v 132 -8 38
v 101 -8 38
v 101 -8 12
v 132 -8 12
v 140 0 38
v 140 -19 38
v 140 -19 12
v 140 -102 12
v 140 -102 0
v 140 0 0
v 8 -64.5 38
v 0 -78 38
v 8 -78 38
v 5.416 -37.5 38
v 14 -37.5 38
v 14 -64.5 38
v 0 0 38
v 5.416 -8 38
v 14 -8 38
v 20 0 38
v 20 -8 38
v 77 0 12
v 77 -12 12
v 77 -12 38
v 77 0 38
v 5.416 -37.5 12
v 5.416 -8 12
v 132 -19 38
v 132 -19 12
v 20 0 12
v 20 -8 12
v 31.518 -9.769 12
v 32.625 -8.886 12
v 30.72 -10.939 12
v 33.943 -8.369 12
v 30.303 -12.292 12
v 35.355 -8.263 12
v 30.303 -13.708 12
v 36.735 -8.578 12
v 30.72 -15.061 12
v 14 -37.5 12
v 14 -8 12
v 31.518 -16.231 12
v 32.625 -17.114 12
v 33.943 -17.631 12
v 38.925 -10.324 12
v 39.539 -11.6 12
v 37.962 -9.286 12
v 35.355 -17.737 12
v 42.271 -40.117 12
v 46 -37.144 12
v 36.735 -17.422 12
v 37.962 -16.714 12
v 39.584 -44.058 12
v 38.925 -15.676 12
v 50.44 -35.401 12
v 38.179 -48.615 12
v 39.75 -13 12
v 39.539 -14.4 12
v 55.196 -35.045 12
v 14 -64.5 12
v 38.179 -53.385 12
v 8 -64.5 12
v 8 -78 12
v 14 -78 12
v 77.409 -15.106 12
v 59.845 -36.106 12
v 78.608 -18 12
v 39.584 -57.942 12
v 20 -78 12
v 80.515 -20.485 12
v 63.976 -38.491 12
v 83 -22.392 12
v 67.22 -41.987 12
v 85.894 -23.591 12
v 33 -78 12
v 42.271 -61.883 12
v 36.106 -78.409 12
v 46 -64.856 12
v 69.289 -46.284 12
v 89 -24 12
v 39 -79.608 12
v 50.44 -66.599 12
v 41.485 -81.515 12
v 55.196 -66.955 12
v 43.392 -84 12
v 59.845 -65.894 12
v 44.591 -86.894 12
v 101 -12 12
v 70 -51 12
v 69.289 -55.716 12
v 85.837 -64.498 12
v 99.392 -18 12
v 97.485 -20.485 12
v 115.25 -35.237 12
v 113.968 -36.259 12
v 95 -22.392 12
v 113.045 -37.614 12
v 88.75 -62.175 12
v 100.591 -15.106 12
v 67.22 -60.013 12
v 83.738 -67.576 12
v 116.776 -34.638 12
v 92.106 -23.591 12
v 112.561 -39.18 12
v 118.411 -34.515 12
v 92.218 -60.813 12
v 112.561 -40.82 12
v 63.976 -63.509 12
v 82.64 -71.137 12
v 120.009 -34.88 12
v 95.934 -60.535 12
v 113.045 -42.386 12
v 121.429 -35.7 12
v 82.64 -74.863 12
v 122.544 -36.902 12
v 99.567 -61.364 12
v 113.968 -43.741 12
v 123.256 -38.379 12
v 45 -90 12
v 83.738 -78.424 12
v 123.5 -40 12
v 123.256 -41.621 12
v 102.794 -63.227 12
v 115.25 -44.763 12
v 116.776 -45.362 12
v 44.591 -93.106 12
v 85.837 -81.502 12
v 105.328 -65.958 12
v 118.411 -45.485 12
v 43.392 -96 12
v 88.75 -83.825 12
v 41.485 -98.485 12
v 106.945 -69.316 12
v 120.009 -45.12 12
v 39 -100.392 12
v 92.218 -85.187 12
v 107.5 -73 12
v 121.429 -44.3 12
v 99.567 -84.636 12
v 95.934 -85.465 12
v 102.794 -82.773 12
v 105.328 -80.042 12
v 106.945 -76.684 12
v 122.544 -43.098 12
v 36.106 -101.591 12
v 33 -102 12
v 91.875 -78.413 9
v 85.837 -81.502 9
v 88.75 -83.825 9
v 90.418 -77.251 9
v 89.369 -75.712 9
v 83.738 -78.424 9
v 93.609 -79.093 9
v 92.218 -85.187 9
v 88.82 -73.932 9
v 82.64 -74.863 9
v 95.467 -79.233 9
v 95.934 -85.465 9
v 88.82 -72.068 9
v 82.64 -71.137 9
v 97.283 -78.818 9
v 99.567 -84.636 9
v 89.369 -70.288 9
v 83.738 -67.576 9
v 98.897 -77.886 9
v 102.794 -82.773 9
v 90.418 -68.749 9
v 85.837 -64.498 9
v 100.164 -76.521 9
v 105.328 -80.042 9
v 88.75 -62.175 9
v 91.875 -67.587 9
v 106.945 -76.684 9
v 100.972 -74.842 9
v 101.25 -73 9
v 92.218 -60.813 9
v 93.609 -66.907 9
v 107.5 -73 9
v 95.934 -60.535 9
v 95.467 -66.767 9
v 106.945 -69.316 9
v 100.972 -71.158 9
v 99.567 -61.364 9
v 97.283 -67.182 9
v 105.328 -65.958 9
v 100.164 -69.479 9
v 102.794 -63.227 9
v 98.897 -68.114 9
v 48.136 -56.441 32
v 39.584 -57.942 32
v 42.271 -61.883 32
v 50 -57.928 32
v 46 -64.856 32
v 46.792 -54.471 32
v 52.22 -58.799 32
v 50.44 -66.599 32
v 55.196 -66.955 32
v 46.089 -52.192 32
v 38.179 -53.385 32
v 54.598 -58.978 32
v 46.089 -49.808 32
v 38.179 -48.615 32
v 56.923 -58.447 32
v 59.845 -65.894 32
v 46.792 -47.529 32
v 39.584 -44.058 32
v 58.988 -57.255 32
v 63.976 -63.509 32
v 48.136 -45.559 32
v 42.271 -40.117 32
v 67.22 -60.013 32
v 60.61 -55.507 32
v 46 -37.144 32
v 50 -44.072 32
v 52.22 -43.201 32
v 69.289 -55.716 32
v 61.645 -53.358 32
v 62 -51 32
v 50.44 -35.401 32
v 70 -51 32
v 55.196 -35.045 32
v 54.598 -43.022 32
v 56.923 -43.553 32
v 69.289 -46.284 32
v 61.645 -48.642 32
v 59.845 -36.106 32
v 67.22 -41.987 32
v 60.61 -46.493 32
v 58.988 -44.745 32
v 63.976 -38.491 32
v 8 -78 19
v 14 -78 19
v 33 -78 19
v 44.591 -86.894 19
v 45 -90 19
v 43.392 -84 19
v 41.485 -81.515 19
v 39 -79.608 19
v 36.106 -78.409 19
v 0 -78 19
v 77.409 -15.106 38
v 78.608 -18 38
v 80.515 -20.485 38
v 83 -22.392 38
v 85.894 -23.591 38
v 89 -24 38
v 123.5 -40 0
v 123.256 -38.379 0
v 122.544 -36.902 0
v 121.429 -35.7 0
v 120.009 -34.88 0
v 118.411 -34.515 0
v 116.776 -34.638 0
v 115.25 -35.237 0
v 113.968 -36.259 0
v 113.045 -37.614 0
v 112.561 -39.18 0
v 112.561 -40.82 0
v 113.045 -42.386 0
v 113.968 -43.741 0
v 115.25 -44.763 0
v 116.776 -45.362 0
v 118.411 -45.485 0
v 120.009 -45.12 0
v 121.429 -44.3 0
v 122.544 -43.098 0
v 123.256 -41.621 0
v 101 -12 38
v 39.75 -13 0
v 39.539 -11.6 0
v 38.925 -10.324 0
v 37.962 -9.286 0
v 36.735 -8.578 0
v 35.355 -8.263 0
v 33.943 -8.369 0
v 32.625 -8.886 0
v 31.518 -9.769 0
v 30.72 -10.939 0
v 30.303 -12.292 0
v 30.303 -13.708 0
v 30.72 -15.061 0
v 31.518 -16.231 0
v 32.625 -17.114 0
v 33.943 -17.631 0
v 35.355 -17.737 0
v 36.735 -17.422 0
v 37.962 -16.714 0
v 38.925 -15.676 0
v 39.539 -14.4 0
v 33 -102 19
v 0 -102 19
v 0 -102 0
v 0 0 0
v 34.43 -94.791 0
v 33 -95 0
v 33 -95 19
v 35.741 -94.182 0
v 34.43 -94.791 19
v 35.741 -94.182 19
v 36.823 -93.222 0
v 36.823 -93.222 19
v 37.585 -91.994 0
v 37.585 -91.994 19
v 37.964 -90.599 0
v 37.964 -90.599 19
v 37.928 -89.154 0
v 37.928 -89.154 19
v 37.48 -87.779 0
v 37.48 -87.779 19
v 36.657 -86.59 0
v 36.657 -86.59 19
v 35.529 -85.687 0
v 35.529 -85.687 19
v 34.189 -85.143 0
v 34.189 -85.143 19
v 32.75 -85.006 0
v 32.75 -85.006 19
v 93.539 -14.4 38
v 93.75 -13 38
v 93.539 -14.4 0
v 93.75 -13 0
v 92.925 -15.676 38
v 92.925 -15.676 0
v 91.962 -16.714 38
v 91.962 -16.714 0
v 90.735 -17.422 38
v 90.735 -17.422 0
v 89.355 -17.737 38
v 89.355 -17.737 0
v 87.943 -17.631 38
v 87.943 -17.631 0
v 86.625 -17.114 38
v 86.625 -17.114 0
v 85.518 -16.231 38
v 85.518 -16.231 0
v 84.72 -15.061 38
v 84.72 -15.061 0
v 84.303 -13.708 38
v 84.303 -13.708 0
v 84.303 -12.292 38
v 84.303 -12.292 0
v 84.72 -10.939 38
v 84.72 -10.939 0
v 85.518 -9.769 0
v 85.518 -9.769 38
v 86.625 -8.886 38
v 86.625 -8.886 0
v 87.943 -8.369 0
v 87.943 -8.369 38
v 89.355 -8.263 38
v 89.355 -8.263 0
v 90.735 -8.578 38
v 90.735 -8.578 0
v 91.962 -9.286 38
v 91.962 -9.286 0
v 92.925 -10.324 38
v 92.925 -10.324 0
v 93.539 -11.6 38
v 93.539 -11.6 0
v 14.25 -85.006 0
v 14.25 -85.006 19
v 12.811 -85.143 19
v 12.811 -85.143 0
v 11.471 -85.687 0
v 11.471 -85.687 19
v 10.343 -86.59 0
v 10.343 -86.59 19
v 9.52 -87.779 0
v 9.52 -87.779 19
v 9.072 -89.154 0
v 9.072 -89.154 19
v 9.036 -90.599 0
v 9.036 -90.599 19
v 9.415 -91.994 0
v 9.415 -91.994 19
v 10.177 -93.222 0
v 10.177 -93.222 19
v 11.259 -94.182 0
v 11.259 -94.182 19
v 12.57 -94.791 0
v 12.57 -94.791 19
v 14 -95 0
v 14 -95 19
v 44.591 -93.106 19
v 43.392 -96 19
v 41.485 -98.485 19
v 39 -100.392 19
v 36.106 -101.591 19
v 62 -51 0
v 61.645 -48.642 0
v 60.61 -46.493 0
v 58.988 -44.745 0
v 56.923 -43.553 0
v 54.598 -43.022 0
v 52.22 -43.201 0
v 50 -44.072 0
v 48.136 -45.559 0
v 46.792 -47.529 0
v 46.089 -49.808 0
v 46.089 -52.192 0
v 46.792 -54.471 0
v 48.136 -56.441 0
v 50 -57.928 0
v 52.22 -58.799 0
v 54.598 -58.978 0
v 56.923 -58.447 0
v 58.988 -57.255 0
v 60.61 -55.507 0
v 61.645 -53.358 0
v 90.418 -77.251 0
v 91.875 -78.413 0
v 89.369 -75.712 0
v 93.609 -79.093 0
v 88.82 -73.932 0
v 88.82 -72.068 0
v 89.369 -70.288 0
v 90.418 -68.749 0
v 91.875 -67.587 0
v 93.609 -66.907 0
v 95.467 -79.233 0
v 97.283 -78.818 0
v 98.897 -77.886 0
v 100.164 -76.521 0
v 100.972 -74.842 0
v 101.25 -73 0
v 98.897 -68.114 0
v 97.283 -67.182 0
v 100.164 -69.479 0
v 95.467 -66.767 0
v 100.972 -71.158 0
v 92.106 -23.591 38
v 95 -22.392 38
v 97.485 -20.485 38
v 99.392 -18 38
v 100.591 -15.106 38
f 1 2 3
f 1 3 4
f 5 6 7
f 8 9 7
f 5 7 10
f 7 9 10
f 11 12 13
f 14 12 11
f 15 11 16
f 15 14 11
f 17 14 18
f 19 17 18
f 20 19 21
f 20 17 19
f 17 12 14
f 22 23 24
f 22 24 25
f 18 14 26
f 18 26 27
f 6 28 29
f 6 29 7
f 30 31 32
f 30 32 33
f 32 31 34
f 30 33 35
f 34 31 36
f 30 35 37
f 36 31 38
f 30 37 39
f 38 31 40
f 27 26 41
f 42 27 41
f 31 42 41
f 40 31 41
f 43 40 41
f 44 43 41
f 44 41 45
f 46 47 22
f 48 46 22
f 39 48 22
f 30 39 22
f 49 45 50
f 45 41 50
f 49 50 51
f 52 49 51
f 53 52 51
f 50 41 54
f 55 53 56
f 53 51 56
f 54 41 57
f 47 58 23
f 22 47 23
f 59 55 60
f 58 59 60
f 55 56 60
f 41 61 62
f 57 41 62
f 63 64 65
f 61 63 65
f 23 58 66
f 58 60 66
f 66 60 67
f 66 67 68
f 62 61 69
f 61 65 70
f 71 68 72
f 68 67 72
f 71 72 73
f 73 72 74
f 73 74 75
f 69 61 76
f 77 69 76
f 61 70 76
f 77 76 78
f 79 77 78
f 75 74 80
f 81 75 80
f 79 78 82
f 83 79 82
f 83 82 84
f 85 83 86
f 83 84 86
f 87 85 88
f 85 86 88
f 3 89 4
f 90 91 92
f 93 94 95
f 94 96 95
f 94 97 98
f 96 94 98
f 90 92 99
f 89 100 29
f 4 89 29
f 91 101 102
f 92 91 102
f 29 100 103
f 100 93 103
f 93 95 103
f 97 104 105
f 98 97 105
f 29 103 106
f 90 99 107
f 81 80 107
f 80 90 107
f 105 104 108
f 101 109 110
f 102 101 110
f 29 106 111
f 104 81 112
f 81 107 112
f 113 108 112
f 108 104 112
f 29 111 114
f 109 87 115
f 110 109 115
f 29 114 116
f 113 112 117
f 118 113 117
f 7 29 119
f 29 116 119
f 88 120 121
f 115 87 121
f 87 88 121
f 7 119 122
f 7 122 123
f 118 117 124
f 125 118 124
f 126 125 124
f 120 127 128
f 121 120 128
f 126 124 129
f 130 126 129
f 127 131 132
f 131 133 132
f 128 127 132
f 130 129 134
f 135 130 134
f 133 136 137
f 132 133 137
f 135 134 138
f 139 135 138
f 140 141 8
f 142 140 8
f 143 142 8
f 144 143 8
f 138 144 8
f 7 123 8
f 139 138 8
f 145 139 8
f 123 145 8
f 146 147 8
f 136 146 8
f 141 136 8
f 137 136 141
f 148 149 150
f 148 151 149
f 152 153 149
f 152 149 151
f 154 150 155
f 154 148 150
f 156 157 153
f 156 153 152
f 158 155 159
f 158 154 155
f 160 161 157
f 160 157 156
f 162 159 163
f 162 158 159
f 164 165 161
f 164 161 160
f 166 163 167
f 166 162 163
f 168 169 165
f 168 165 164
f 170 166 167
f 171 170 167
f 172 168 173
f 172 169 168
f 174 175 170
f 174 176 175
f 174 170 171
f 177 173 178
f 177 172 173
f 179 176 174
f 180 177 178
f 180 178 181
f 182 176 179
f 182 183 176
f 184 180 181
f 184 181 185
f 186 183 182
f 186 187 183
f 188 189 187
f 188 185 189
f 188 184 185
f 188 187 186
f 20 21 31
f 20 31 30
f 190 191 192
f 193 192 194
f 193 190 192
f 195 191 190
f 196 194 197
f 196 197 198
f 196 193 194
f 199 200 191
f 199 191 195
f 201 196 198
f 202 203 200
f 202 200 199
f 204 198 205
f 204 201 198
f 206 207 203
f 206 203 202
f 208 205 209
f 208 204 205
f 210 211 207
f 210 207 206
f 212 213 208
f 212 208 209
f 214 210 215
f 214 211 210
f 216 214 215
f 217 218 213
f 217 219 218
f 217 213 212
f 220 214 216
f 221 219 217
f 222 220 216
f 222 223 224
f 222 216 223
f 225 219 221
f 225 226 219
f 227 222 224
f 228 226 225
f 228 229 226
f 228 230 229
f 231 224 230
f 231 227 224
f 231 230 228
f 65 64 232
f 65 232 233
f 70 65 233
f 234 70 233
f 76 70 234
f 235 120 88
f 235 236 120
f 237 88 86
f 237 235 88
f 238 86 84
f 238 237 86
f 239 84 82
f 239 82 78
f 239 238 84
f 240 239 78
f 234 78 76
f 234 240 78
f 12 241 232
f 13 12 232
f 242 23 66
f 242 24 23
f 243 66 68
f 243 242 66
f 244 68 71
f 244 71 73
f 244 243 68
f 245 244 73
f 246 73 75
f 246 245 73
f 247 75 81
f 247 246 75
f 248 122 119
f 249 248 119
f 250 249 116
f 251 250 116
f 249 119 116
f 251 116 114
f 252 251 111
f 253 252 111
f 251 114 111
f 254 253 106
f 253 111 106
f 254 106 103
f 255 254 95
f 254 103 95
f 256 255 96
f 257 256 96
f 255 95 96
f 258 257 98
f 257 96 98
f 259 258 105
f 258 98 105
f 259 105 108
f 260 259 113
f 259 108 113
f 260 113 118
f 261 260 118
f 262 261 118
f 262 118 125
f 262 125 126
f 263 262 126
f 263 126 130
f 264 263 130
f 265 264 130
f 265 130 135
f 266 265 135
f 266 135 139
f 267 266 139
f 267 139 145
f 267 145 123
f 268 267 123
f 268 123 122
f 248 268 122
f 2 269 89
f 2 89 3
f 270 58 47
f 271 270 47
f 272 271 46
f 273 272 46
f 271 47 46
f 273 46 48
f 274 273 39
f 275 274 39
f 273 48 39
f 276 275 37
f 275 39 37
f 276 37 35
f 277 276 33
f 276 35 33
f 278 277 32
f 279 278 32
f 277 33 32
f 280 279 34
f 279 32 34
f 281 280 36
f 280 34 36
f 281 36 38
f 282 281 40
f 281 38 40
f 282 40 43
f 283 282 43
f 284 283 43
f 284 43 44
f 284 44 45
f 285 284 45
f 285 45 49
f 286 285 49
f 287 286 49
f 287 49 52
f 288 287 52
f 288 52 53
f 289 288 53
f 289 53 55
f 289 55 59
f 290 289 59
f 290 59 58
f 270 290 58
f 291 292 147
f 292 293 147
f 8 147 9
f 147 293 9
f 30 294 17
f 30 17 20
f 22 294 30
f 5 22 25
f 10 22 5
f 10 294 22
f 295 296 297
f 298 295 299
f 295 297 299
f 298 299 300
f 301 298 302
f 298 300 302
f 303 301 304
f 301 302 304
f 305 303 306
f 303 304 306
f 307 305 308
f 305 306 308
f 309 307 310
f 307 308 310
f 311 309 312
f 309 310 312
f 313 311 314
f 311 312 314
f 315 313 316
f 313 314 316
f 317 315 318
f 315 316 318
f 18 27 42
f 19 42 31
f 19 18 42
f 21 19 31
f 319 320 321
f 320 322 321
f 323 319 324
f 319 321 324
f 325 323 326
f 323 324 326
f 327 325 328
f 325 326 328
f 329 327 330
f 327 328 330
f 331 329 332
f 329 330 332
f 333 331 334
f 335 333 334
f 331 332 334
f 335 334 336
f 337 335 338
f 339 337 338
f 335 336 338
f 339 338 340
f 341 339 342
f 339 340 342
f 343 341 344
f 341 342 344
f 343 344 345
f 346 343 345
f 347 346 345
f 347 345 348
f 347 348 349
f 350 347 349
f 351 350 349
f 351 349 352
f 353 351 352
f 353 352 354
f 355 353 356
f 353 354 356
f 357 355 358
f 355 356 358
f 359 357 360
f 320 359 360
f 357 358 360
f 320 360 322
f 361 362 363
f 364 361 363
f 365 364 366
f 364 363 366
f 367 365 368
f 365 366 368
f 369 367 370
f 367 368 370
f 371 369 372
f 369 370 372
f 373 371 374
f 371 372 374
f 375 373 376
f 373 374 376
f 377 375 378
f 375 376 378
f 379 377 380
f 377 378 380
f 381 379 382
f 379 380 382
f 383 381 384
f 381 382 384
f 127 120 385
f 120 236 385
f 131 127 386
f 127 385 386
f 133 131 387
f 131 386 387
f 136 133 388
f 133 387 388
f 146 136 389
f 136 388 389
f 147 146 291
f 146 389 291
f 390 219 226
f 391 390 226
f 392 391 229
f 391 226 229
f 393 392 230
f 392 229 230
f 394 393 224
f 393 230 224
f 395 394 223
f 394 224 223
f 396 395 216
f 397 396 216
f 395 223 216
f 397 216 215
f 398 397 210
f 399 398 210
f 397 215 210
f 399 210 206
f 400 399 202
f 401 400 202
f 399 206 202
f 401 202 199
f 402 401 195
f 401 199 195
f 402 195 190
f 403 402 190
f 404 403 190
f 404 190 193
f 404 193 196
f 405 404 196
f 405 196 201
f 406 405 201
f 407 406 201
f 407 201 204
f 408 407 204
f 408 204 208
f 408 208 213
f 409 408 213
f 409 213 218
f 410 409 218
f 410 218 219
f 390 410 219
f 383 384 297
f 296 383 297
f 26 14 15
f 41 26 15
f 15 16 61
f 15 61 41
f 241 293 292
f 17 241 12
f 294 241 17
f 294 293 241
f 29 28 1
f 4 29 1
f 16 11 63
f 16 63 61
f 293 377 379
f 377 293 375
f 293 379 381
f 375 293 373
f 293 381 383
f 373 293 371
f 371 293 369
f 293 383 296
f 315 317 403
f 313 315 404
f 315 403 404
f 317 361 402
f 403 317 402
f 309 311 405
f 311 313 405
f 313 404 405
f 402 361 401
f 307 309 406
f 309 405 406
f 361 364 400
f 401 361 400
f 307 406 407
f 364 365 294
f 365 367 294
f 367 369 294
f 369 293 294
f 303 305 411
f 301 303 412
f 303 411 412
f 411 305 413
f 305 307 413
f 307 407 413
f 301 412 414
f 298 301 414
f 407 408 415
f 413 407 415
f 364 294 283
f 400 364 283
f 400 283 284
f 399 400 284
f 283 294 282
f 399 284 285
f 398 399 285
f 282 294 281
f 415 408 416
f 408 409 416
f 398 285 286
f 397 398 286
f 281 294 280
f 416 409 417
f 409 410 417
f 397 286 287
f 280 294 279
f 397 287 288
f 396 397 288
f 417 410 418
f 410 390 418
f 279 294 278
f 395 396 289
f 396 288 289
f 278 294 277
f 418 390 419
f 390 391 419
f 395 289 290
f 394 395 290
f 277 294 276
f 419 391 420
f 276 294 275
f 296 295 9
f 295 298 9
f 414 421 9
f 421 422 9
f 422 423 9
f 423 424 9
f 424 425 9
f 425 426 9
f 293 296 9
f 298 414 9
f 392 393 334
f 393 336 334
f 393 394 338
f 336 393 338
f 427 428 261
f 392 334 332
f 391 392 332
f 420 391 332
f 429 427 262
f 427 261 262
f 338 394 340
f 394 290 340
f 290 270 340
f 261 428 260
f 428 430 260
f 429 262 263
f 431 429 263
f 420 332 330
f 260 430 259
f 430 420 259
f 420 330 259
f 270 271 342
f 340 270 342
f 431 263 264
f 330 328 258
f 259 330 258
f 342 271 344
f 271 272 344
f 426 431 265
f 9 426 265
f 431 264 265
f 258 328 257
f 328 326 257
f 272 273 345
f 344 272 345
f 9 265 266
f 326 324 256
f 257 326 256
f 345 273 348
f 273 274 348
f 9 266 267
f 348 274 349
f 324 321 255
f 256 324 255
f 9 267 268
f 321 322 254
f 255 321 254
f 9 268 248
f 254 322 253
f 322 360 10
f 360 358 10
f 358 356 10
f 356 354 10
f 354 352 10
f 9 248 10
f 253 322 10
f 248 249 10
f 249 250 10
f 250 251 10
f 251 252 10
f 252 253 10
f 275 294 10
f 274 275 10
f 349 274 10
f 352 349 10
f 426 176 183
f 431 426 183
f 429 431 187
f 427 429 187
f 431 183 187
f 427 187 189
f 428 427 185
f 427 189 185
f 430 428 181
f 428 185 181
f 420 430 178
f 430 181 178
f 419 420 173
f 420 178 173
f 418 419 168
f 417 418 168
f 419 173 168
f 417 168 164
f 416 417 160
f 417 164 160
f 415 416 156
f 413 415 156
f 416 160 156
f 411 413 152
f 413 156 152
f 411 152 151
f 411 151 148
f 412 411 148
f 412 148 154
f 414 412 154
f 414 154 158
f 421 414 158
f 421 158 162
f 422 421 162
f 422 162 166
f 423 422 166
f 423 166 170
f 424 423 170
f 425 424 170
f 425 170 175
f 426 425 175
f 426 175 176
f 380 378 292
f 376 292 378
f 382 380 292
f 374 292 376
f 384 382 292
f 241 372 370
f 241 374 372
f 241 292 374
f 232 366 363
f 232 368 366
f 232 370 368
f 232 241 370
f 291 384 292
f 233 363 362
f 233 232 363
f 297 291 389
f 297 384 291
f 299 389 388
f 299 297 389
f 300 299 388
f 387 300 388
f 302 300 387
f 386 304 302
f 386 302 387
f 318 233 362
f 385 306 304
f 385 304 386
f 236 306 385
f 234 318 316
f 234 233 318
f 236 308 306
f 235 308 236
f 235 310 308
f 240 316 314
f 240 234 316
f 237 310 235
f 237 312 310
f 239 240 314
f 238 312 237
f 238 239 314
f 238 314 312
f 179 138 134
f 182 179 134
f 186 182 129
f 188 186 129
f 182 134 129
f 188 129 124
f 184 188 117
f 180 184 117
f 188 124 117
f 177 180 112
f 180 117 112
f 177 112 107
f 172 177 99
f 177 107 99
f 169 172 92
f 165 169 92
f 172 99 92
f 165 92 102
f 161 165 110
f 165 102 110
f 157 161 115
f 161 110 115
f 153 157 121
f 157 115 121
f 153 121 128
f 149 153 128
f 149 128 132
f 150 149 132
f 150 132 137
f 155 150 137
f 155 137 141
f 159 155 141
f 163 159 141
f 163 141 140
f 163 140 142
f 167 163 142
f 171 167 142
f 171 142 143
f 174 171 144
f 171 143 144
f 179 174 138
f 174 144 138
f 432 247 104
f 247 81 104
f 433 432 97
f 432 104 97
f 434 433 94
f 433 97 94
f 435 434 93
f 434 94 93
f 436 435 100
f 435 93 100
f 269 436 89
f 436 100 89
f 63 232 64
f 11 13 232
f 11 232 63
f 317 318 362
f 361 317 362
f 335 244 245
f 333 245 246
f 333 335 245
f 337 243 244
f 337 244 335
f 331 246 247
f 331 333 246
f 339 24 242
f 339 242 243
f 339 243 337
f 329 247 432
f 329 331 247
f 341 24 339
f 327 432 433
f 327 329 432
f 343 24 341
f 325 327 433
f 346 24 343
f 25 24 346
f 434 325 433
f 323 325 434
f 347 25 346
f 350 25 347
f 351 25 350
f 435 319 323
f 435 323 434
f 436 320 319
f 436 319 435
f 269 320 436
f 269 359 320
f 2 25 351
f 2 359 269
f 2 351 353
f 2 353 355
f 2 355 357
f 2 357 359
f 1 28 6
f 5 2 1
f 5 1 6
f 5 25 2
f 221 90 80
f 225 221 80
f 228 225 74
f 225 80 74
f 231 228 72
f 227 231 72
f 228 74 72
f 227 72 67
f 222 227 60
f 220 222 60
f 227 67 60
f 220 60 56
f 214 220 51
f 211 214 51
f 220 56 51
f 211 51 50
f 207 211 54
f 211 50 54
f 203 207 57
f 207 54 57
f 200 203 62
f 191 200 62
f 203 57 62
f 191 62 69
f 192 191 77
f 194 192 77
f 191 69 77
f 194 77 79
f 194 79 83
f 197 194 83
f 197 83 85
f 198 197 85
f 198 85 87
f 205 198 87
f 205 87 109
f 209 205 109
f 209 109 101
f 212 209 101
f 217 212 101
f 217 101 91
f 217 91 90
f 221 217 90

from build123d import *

# Parameters (mm, degrees)
F0_W      = 140
F0_H      = 38
F1_DEPTH  = 102
F2_R      = 4.75
F3_DEPTH  = 40
F4_R      = 8
F5_DEPTH  = 40
F6_R      = 6.25
F7_DEPTH  = 40
F8_R      = 5.5
F9_DEPTH  = 40
F10_W     = 140
F10_H     = 26
F11_DEPTH = 102
F12_R     = 16
F13_DEPTH = 26
F14_R     = 8
F15_DEPTH = 26
F16_W     = 45
F16_H     = 24
F17_DEPTH = 7
F18_R     = 12
F19_R     = 11.99999
F20_W     = 20
F20_H     = 78
F21_DEPTH = 26
F22_W     = 63
F22_H     = 24
F23_DEPTH = 26
F24_R     = 4.75
F25_DEPTH = 38
F26_R     = 12
F27_R     = 5
F28_DEPTH = 40
F30_DEPTH = 40
F31_W     = 19
F31_H     = 5
F32_DEPTH = 40
F33_W     = 31
F33_H     = 16
F34_DEPTH = 26
F35_R     = 11.99999
F36_W     = 8
F36_H     = 5
F37_DEPTH = 26
F38_R     = 16
F39_DEPTH = 6
F40_W     = 6
F40_H     = 74.1499609053
F41_DEPTH = 26
F42_W     = 6
F42_H     = 4
F43_DEPTH = 26
F44_W     = 6
F44_H     = 13.5
F45_DEPTH = 26
F46_W     = 8.5837110281
F46_H     = 29.5
F47_DEPTH = 26
F48_W     = 6
F48_H     = 0.1499609053
F49_DEPTH = 26
F50_R     = 12.5
F51_DEPTH = 3


# Not quite as in the source:
# - a fillet or chamfer is up to 0.001 mm smaller than in the source, because OpenCascade refuses the exact size


with BuildPart() as f1:
    # F0 (on Front) → F1 (new body)
    with BuildSketch(Plane.XZ):
        with Locations((70, 19)):
            Rectangle(F0_W, F0_H)
    extrude(amount=F1_DEPTH)

    # F2 (on face) → F3 (cut)
    with BuildSketch(Plane.XY.offset(38)):
        with Locations((35, -13)):
            Circle(F2_R)
        with Locations((89, -13)):
            Circle(F2_R)
    extrude(amount=-F3_DEPTH, mode=Mode.SUBTRACT)

    # F4 (on face) → F5 (cut)
    with BuildSketch(Plane.XY.offset(38)):
        with Locations((54, -51)):
            Circle(F4_R)
    extrude(amount=-F5_DEPTH, mode=Mode.SUBTRACT)

    # F6 (on face) → F7 (cut)
    with BuildSketch(Plane.XY.offset(38)):
        with Locations((95, -73)):
            Circle(F6_R)
    extrude(amount=-F7_DEPTH, mode=Mode.SUBTRACT)

    # F8 (on face) → F9 (cut)
    with BuildSketch(Plane.XY.offset(38)):
        with Locations((118, -40)):
            Circle(F8_R)
    extrude(amount=-F9_DEPTH, mode=Mode.SUBTRACT)

    # F10 (on face) → F11 (cut)
    with BuildSketch(Plane.XZ.offset(102)):
        with Locations((70, 25)):
            Rectangle(F10_W, F10_H)
    extrude(amount=-F11_DEPTH, mode=Mode.SUBTRACT)

    # F12 (on face) → F13 (join)
    with BuildSketch(Plane.XY.offset(12)):
        with Locations((54, -51)):
            Circle(F12_R)
    extrude(amount=F13_DEPTH)

    # F14 (on face) → F15 (cut)
    with BuildSketch(Plane.XY.offset(38)):
        with Locations((54, -51)):
            Circle(F14_R)
    extrude(amount=-F15_DEPTH, mode=Mode.SUBTRACT)

    # F16 (on face) → F17 (join)
    with BuildSketch(Plane.XY.offset(12)):
        with Locations((22.5, -90)):
            Rectangle(F16_W, F16_H)
    extrude(amount=F17_DEPTH)

    # F18
    f18_edges = [f1.edges().sort_by_distance(p)[0] for p in [
        (45, -78, 15.5),
    ]]
    fillet(f18_edges, radius=F18_R)

    # F19 (radius 12 in the source; OpenCascade refuses exactly that, so slightly less here)
    f19_edges = [f1.edges().sort_by_distance(p)[0] for p in [
        (45, -102, 15.5),
    ]]
    fillet(f19_edges, radius=F19_R)

    # F20 (on face) → F21 (join)
    with BuildSketch(Plane.XY.offset(12)):
        with Locations((10, -39)):
            Rectangle(F20_W, F20_H)
    extrude(amount=F21_DEPTH)

    # F22 (on face) → F23 (join)
    with BuildSketch(Plane.XY.offset(12)):
        with Locations((108.5, -12)):
            Rectangle(F22_W, F22_H)
    extrude(amount=F23_DEPTH)

    # F24 (on face) → F25 (cut)
    with BuildSketch(Plane(origin=(0, 0, 0), x_dir=(1, 0, 0), z_dir=(0, 0, -1))):
        with Locations((89, 13)):
            Circle(F24_R)
    extrude(amount=-F25_DEPTH, mode=Mode.SUBTRACT)

    # F26
    f26_edges = [f1.edges().sort_by_distance(p)[0] for p in [
        (77, -24, 25),
    ]]
    fillet(f26_edges, radius=F26_R)

    # F27 (on face) → F28 (cut)
    with BuildSketch(Plane.XY.offset(19)):
        with Locations((14, -90)):
            Circle(F27_R)
        with Locations((33, -90)):
            Circle(F27_R)
    extrude(amount=-F28_DEPTH, mode=Mode.SUBTRACT)

    # F29 (on face) → F30 (cut)
    with BuildSketch(Plane.XY.offset(19)):
        with BuildLine():
            ThreePointArc((14.2498681067, -85.00624731), (17.6227986788, -86.5539399696), (19, -90))
            Line((19, -90), (28, -90))
            ThreePointArc((28, -90), (29.3772013212, -86.5539399696), (32.7501318933, -85.00624731))
            Line((32.7501318933, -85.00624731), (14.2498681067, -85.00624731))
        make_face()
    extrude(amount=-F30_DEPTH, mode=Mode.SUBTRACT)

    # F31 (on face) → F32 (cut)
    with BuildSketch(Plane.XY.offset(19)):
        with Locations((23.5, -92.5)):
            Rectangle(F31_W, F31_H)
    extrude(amount=-F32_DEPTH, mode=Mode.SUBTRACT)

    # F33 (on face) → F34 (cut)
    with BuildSketch(Plane.XY.offset(38)):
        with Locations((116.5, -16)):
            Rectangle(F33_W, F33_H)
    extrude(amount=-F34_DEPTH, mode=Mode.SUBTRACT)

    # F35 (radius 12 in the source; OpenCascade refuses exactly that, so slightly less here)
    f35_edges = [f1.edges().sort_by_distance(p)[0] for p in [
        (101, -24, 25),
    ]]
    fillet(f35_edges, radius=F35_R)

    # F36 (on face) → F37 (cut)
    with BuildSketch(Plane.XY.offset(38)):
        with Locations((136, -21.5)):
            Rectangle(F36_W, F36_H)
    extrude(amount=-F37_DEPTH, mode=Mode.SUBTRACT)

    # F38 (on face) → F39 (cut)
    with BuildSketch(Plane.XY.offset(38)):
        with Locations((54, -51)):
            Circle(F38_R)
    extrude(amount=-F39_DEPTH, mode=Mode.SUBTRACT)

    # F40 (on face) → F41 (cut)
    with BuildSketch(Plane.XY.offset(38)):
        with Locations((17, -40.9250195473)):
            Rectangle(F40_W, F40_H)
    extrude(amount=-F41_DEPTH, mode=Mode.SUBTRACT)

    # F42 (on face) → F43 (join)
    with BuildSketch(Plane.XY.offset(12)):
        with Locations((17, -5.8500390947)):
            Rectangle(F42_W, F42_H)
    extrude(amount=F43_DEPTH)

    # F44 (on face) → F45 (cut)
    with BuildSketch(Plane.XY.offset(38)):
        with Locations((11, -71.25)):
            Rectangle(F44_W, F44_H)
    extrude(amount=-F45_DEPTH, mode=Mode.SUBTRACT)

    # F46 (on face) → F47 (cut)
    with BuildSketch(Plane.XY.offset(38)):
        with Locations((9.708144486, -22.75)):
            Rectangle(F46_W, F46_H)
    extrude(amount=-F47_DEPTH, mode=Mode.SUBTRACT)

    # F48 (on face) → F49 (join)
    with BuildSketch(Plane.XY.offset(38)):
        with Locations((17, -7.9250195473)):
            Rectangle(F48_W, F48_H)
    extrude(amount=-F49_DEPTH)

    # F50 (on face) → F51 (cut)
    with BuildSketch(Plane.XY.offset(12)):
        with Locations((95, -73)):
            Circle(F50_R)
    extrude(amount=-F51_DEPTH, mode=Mode.SUBTRACT)


solid = f1.part
